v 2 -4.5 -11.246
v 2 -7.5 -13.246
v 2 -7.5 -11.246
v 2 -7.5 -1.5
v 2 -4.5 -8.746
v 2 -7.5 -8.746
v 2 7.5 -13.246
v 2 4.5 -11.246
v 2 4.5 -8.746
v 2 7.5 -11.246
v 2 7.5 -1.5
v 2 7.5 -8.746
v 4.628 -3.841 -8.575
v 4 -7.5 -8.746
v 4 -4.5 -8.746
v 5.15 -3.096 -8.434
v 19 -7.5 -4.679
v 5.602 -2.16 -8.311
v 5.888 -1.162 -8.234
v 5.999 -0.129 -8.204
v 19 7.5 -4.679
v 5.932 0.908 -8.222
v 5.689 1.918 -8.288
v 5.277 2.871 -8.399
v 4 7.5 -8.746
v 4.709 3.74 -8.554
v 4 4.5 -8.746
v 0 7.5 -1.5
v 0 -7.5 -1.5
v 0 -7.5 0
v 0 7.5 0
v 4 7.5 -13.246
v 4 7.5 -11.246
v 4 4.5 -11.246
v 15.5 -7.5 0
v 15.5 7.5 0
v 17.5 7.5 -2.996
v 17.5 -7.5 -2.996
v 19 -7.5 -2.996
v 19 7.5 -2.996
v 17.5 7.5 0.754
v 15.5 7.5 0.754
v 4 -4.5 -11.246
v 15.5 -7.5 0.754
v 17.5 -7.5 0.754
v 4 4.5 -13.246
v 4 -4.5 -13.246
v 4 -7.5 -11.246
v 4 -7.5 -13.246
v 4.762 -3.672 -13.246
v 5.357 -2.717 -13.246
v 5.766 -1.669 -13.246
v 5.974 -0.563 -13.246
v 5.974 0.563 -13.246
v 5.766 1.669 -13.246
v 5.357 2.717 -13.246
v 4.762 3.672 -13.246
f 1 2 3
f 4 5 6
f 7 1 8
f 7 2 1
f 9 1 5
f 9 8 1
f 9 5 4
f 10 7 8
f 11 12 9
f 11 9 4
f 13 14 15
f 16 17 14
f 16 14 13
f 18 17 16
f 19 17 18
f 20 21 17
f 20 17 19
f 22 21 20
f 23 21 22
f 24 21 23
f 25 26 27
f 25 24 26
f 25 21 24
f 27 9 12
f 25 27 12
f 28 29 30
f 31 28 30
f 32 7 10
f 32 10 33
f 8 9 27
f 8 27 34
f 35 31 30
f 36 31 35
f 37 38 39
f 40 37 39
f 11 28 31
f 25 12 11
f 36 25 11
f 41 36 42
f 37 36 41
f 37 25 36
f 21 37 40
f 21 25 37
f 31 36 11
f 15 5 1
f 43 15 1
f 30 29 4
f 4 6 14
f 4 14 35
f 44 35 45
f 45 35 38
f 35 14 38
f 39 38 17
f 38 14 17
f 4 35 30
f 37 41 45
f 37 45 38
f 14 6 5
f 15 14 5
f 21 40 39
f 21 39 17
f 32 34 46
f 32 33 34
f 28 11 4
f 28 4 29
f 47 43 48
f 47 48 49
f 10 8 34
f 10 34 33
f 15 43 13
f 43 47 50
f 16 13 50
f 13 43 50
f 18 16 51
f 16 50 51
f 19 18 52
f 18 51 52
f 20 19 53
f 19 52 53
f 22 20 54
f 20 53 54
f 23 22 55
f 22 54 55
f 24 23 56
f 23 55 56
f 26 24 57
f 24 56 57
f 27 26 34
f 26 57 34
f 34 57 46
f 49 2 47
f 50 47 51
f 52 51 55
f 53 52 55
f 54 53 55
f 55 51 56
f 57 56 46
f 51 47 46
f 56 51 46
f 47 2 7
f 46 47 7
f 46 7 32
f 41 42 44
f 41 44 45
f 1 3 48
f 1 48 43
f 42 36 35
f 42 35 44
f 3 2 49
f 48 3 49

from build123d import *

# Parameters (mm, degrees)
BOSS_EXTRUDE1_DEPTH = 7.5
SKETCH2_W           = 2.5
SKETCH2_H           = 3
CUT_EXTRUDE2_DEPTH  = 20
BOSS_EXTRUDE2_REACH = 16


with BuildPart() as part:
    # Sketch1 → Boss-Extrude1 (new body, symmetric)
    with BuildSketch(Plane(origin=(0, 0, 0), x_dir=(1, 0, 0), z_dir=(0, 1, 0))):
        Polygon((2, 13.245621125), (2, 1.5), (0, 1.5), (0, 0), (15.5, 0), (15.5, -0.754378875), (17.5, -0.754378875), (17.5, 1.128157441), (17.5, 2.995621125), (19, 2.995621125), (19, 4.67916542), (4, 8.745621125), (4, 13.245621125), align=None)
    extrude(amount=BOSS_EXTRUDE1_DEPTH, both=True)

    # Sketch2 → Cut-Extrude2 (cut, through all)
    with BuildSketch(Plane(origin=(0, 0, 0), x_dir=(0, 0, -1), z_dir=(1, 0, 0))):
        with Locations((9.995621125, 6)):
            Rectangle(SKETCH2_W, SKETCH2_H)
        with Locations((9.995621125, -6)):
            Rectangle(SKETCH2_W, SKETCH2_H)
    extrude(amount=CUT_EXTRUDE2_DEPTH, mode=Mode.SUBTRACT)

    # Boss-Extrude2: up to this face of the body (flat: up to its plane)
    boss_extrude2_end = Plane(part.part.faces().sort_by_distance((11.5, 0, -6.712393272))[0])
    # Sketch4 → Boss-Extrude2 (add, up to the picked face)
    with BuildSketch(Plane(origin=(0, 0, -13.245621125), x_dir=(-1, 0, 0), z_dir=(0, 0, -1)), mode=Mode.PRIVATE) as boss_extrude2_sk1:
        with BuildLine():
            Line((-4, 4.5), (-4, -4.5))
            ThreePointArc((-4, -4.5), (-6, 0), (-4, 4.5))
        make_face()
    boss_extrude2_tool1 = split(extrude(boss_extrude2_sk1.sketch, amount=-BOSS_EXTRUDE2_REACH, mode=Mode.PRIVATE), bisect_by=boss_extrude2_end, keep=Keep.BOTH, mode=Mode.PRIVATE)
    add(boss_extrude2_tool1.solids().sort_by_distance((4.812513, 0, -13.245621))[0])


solid = part.part
